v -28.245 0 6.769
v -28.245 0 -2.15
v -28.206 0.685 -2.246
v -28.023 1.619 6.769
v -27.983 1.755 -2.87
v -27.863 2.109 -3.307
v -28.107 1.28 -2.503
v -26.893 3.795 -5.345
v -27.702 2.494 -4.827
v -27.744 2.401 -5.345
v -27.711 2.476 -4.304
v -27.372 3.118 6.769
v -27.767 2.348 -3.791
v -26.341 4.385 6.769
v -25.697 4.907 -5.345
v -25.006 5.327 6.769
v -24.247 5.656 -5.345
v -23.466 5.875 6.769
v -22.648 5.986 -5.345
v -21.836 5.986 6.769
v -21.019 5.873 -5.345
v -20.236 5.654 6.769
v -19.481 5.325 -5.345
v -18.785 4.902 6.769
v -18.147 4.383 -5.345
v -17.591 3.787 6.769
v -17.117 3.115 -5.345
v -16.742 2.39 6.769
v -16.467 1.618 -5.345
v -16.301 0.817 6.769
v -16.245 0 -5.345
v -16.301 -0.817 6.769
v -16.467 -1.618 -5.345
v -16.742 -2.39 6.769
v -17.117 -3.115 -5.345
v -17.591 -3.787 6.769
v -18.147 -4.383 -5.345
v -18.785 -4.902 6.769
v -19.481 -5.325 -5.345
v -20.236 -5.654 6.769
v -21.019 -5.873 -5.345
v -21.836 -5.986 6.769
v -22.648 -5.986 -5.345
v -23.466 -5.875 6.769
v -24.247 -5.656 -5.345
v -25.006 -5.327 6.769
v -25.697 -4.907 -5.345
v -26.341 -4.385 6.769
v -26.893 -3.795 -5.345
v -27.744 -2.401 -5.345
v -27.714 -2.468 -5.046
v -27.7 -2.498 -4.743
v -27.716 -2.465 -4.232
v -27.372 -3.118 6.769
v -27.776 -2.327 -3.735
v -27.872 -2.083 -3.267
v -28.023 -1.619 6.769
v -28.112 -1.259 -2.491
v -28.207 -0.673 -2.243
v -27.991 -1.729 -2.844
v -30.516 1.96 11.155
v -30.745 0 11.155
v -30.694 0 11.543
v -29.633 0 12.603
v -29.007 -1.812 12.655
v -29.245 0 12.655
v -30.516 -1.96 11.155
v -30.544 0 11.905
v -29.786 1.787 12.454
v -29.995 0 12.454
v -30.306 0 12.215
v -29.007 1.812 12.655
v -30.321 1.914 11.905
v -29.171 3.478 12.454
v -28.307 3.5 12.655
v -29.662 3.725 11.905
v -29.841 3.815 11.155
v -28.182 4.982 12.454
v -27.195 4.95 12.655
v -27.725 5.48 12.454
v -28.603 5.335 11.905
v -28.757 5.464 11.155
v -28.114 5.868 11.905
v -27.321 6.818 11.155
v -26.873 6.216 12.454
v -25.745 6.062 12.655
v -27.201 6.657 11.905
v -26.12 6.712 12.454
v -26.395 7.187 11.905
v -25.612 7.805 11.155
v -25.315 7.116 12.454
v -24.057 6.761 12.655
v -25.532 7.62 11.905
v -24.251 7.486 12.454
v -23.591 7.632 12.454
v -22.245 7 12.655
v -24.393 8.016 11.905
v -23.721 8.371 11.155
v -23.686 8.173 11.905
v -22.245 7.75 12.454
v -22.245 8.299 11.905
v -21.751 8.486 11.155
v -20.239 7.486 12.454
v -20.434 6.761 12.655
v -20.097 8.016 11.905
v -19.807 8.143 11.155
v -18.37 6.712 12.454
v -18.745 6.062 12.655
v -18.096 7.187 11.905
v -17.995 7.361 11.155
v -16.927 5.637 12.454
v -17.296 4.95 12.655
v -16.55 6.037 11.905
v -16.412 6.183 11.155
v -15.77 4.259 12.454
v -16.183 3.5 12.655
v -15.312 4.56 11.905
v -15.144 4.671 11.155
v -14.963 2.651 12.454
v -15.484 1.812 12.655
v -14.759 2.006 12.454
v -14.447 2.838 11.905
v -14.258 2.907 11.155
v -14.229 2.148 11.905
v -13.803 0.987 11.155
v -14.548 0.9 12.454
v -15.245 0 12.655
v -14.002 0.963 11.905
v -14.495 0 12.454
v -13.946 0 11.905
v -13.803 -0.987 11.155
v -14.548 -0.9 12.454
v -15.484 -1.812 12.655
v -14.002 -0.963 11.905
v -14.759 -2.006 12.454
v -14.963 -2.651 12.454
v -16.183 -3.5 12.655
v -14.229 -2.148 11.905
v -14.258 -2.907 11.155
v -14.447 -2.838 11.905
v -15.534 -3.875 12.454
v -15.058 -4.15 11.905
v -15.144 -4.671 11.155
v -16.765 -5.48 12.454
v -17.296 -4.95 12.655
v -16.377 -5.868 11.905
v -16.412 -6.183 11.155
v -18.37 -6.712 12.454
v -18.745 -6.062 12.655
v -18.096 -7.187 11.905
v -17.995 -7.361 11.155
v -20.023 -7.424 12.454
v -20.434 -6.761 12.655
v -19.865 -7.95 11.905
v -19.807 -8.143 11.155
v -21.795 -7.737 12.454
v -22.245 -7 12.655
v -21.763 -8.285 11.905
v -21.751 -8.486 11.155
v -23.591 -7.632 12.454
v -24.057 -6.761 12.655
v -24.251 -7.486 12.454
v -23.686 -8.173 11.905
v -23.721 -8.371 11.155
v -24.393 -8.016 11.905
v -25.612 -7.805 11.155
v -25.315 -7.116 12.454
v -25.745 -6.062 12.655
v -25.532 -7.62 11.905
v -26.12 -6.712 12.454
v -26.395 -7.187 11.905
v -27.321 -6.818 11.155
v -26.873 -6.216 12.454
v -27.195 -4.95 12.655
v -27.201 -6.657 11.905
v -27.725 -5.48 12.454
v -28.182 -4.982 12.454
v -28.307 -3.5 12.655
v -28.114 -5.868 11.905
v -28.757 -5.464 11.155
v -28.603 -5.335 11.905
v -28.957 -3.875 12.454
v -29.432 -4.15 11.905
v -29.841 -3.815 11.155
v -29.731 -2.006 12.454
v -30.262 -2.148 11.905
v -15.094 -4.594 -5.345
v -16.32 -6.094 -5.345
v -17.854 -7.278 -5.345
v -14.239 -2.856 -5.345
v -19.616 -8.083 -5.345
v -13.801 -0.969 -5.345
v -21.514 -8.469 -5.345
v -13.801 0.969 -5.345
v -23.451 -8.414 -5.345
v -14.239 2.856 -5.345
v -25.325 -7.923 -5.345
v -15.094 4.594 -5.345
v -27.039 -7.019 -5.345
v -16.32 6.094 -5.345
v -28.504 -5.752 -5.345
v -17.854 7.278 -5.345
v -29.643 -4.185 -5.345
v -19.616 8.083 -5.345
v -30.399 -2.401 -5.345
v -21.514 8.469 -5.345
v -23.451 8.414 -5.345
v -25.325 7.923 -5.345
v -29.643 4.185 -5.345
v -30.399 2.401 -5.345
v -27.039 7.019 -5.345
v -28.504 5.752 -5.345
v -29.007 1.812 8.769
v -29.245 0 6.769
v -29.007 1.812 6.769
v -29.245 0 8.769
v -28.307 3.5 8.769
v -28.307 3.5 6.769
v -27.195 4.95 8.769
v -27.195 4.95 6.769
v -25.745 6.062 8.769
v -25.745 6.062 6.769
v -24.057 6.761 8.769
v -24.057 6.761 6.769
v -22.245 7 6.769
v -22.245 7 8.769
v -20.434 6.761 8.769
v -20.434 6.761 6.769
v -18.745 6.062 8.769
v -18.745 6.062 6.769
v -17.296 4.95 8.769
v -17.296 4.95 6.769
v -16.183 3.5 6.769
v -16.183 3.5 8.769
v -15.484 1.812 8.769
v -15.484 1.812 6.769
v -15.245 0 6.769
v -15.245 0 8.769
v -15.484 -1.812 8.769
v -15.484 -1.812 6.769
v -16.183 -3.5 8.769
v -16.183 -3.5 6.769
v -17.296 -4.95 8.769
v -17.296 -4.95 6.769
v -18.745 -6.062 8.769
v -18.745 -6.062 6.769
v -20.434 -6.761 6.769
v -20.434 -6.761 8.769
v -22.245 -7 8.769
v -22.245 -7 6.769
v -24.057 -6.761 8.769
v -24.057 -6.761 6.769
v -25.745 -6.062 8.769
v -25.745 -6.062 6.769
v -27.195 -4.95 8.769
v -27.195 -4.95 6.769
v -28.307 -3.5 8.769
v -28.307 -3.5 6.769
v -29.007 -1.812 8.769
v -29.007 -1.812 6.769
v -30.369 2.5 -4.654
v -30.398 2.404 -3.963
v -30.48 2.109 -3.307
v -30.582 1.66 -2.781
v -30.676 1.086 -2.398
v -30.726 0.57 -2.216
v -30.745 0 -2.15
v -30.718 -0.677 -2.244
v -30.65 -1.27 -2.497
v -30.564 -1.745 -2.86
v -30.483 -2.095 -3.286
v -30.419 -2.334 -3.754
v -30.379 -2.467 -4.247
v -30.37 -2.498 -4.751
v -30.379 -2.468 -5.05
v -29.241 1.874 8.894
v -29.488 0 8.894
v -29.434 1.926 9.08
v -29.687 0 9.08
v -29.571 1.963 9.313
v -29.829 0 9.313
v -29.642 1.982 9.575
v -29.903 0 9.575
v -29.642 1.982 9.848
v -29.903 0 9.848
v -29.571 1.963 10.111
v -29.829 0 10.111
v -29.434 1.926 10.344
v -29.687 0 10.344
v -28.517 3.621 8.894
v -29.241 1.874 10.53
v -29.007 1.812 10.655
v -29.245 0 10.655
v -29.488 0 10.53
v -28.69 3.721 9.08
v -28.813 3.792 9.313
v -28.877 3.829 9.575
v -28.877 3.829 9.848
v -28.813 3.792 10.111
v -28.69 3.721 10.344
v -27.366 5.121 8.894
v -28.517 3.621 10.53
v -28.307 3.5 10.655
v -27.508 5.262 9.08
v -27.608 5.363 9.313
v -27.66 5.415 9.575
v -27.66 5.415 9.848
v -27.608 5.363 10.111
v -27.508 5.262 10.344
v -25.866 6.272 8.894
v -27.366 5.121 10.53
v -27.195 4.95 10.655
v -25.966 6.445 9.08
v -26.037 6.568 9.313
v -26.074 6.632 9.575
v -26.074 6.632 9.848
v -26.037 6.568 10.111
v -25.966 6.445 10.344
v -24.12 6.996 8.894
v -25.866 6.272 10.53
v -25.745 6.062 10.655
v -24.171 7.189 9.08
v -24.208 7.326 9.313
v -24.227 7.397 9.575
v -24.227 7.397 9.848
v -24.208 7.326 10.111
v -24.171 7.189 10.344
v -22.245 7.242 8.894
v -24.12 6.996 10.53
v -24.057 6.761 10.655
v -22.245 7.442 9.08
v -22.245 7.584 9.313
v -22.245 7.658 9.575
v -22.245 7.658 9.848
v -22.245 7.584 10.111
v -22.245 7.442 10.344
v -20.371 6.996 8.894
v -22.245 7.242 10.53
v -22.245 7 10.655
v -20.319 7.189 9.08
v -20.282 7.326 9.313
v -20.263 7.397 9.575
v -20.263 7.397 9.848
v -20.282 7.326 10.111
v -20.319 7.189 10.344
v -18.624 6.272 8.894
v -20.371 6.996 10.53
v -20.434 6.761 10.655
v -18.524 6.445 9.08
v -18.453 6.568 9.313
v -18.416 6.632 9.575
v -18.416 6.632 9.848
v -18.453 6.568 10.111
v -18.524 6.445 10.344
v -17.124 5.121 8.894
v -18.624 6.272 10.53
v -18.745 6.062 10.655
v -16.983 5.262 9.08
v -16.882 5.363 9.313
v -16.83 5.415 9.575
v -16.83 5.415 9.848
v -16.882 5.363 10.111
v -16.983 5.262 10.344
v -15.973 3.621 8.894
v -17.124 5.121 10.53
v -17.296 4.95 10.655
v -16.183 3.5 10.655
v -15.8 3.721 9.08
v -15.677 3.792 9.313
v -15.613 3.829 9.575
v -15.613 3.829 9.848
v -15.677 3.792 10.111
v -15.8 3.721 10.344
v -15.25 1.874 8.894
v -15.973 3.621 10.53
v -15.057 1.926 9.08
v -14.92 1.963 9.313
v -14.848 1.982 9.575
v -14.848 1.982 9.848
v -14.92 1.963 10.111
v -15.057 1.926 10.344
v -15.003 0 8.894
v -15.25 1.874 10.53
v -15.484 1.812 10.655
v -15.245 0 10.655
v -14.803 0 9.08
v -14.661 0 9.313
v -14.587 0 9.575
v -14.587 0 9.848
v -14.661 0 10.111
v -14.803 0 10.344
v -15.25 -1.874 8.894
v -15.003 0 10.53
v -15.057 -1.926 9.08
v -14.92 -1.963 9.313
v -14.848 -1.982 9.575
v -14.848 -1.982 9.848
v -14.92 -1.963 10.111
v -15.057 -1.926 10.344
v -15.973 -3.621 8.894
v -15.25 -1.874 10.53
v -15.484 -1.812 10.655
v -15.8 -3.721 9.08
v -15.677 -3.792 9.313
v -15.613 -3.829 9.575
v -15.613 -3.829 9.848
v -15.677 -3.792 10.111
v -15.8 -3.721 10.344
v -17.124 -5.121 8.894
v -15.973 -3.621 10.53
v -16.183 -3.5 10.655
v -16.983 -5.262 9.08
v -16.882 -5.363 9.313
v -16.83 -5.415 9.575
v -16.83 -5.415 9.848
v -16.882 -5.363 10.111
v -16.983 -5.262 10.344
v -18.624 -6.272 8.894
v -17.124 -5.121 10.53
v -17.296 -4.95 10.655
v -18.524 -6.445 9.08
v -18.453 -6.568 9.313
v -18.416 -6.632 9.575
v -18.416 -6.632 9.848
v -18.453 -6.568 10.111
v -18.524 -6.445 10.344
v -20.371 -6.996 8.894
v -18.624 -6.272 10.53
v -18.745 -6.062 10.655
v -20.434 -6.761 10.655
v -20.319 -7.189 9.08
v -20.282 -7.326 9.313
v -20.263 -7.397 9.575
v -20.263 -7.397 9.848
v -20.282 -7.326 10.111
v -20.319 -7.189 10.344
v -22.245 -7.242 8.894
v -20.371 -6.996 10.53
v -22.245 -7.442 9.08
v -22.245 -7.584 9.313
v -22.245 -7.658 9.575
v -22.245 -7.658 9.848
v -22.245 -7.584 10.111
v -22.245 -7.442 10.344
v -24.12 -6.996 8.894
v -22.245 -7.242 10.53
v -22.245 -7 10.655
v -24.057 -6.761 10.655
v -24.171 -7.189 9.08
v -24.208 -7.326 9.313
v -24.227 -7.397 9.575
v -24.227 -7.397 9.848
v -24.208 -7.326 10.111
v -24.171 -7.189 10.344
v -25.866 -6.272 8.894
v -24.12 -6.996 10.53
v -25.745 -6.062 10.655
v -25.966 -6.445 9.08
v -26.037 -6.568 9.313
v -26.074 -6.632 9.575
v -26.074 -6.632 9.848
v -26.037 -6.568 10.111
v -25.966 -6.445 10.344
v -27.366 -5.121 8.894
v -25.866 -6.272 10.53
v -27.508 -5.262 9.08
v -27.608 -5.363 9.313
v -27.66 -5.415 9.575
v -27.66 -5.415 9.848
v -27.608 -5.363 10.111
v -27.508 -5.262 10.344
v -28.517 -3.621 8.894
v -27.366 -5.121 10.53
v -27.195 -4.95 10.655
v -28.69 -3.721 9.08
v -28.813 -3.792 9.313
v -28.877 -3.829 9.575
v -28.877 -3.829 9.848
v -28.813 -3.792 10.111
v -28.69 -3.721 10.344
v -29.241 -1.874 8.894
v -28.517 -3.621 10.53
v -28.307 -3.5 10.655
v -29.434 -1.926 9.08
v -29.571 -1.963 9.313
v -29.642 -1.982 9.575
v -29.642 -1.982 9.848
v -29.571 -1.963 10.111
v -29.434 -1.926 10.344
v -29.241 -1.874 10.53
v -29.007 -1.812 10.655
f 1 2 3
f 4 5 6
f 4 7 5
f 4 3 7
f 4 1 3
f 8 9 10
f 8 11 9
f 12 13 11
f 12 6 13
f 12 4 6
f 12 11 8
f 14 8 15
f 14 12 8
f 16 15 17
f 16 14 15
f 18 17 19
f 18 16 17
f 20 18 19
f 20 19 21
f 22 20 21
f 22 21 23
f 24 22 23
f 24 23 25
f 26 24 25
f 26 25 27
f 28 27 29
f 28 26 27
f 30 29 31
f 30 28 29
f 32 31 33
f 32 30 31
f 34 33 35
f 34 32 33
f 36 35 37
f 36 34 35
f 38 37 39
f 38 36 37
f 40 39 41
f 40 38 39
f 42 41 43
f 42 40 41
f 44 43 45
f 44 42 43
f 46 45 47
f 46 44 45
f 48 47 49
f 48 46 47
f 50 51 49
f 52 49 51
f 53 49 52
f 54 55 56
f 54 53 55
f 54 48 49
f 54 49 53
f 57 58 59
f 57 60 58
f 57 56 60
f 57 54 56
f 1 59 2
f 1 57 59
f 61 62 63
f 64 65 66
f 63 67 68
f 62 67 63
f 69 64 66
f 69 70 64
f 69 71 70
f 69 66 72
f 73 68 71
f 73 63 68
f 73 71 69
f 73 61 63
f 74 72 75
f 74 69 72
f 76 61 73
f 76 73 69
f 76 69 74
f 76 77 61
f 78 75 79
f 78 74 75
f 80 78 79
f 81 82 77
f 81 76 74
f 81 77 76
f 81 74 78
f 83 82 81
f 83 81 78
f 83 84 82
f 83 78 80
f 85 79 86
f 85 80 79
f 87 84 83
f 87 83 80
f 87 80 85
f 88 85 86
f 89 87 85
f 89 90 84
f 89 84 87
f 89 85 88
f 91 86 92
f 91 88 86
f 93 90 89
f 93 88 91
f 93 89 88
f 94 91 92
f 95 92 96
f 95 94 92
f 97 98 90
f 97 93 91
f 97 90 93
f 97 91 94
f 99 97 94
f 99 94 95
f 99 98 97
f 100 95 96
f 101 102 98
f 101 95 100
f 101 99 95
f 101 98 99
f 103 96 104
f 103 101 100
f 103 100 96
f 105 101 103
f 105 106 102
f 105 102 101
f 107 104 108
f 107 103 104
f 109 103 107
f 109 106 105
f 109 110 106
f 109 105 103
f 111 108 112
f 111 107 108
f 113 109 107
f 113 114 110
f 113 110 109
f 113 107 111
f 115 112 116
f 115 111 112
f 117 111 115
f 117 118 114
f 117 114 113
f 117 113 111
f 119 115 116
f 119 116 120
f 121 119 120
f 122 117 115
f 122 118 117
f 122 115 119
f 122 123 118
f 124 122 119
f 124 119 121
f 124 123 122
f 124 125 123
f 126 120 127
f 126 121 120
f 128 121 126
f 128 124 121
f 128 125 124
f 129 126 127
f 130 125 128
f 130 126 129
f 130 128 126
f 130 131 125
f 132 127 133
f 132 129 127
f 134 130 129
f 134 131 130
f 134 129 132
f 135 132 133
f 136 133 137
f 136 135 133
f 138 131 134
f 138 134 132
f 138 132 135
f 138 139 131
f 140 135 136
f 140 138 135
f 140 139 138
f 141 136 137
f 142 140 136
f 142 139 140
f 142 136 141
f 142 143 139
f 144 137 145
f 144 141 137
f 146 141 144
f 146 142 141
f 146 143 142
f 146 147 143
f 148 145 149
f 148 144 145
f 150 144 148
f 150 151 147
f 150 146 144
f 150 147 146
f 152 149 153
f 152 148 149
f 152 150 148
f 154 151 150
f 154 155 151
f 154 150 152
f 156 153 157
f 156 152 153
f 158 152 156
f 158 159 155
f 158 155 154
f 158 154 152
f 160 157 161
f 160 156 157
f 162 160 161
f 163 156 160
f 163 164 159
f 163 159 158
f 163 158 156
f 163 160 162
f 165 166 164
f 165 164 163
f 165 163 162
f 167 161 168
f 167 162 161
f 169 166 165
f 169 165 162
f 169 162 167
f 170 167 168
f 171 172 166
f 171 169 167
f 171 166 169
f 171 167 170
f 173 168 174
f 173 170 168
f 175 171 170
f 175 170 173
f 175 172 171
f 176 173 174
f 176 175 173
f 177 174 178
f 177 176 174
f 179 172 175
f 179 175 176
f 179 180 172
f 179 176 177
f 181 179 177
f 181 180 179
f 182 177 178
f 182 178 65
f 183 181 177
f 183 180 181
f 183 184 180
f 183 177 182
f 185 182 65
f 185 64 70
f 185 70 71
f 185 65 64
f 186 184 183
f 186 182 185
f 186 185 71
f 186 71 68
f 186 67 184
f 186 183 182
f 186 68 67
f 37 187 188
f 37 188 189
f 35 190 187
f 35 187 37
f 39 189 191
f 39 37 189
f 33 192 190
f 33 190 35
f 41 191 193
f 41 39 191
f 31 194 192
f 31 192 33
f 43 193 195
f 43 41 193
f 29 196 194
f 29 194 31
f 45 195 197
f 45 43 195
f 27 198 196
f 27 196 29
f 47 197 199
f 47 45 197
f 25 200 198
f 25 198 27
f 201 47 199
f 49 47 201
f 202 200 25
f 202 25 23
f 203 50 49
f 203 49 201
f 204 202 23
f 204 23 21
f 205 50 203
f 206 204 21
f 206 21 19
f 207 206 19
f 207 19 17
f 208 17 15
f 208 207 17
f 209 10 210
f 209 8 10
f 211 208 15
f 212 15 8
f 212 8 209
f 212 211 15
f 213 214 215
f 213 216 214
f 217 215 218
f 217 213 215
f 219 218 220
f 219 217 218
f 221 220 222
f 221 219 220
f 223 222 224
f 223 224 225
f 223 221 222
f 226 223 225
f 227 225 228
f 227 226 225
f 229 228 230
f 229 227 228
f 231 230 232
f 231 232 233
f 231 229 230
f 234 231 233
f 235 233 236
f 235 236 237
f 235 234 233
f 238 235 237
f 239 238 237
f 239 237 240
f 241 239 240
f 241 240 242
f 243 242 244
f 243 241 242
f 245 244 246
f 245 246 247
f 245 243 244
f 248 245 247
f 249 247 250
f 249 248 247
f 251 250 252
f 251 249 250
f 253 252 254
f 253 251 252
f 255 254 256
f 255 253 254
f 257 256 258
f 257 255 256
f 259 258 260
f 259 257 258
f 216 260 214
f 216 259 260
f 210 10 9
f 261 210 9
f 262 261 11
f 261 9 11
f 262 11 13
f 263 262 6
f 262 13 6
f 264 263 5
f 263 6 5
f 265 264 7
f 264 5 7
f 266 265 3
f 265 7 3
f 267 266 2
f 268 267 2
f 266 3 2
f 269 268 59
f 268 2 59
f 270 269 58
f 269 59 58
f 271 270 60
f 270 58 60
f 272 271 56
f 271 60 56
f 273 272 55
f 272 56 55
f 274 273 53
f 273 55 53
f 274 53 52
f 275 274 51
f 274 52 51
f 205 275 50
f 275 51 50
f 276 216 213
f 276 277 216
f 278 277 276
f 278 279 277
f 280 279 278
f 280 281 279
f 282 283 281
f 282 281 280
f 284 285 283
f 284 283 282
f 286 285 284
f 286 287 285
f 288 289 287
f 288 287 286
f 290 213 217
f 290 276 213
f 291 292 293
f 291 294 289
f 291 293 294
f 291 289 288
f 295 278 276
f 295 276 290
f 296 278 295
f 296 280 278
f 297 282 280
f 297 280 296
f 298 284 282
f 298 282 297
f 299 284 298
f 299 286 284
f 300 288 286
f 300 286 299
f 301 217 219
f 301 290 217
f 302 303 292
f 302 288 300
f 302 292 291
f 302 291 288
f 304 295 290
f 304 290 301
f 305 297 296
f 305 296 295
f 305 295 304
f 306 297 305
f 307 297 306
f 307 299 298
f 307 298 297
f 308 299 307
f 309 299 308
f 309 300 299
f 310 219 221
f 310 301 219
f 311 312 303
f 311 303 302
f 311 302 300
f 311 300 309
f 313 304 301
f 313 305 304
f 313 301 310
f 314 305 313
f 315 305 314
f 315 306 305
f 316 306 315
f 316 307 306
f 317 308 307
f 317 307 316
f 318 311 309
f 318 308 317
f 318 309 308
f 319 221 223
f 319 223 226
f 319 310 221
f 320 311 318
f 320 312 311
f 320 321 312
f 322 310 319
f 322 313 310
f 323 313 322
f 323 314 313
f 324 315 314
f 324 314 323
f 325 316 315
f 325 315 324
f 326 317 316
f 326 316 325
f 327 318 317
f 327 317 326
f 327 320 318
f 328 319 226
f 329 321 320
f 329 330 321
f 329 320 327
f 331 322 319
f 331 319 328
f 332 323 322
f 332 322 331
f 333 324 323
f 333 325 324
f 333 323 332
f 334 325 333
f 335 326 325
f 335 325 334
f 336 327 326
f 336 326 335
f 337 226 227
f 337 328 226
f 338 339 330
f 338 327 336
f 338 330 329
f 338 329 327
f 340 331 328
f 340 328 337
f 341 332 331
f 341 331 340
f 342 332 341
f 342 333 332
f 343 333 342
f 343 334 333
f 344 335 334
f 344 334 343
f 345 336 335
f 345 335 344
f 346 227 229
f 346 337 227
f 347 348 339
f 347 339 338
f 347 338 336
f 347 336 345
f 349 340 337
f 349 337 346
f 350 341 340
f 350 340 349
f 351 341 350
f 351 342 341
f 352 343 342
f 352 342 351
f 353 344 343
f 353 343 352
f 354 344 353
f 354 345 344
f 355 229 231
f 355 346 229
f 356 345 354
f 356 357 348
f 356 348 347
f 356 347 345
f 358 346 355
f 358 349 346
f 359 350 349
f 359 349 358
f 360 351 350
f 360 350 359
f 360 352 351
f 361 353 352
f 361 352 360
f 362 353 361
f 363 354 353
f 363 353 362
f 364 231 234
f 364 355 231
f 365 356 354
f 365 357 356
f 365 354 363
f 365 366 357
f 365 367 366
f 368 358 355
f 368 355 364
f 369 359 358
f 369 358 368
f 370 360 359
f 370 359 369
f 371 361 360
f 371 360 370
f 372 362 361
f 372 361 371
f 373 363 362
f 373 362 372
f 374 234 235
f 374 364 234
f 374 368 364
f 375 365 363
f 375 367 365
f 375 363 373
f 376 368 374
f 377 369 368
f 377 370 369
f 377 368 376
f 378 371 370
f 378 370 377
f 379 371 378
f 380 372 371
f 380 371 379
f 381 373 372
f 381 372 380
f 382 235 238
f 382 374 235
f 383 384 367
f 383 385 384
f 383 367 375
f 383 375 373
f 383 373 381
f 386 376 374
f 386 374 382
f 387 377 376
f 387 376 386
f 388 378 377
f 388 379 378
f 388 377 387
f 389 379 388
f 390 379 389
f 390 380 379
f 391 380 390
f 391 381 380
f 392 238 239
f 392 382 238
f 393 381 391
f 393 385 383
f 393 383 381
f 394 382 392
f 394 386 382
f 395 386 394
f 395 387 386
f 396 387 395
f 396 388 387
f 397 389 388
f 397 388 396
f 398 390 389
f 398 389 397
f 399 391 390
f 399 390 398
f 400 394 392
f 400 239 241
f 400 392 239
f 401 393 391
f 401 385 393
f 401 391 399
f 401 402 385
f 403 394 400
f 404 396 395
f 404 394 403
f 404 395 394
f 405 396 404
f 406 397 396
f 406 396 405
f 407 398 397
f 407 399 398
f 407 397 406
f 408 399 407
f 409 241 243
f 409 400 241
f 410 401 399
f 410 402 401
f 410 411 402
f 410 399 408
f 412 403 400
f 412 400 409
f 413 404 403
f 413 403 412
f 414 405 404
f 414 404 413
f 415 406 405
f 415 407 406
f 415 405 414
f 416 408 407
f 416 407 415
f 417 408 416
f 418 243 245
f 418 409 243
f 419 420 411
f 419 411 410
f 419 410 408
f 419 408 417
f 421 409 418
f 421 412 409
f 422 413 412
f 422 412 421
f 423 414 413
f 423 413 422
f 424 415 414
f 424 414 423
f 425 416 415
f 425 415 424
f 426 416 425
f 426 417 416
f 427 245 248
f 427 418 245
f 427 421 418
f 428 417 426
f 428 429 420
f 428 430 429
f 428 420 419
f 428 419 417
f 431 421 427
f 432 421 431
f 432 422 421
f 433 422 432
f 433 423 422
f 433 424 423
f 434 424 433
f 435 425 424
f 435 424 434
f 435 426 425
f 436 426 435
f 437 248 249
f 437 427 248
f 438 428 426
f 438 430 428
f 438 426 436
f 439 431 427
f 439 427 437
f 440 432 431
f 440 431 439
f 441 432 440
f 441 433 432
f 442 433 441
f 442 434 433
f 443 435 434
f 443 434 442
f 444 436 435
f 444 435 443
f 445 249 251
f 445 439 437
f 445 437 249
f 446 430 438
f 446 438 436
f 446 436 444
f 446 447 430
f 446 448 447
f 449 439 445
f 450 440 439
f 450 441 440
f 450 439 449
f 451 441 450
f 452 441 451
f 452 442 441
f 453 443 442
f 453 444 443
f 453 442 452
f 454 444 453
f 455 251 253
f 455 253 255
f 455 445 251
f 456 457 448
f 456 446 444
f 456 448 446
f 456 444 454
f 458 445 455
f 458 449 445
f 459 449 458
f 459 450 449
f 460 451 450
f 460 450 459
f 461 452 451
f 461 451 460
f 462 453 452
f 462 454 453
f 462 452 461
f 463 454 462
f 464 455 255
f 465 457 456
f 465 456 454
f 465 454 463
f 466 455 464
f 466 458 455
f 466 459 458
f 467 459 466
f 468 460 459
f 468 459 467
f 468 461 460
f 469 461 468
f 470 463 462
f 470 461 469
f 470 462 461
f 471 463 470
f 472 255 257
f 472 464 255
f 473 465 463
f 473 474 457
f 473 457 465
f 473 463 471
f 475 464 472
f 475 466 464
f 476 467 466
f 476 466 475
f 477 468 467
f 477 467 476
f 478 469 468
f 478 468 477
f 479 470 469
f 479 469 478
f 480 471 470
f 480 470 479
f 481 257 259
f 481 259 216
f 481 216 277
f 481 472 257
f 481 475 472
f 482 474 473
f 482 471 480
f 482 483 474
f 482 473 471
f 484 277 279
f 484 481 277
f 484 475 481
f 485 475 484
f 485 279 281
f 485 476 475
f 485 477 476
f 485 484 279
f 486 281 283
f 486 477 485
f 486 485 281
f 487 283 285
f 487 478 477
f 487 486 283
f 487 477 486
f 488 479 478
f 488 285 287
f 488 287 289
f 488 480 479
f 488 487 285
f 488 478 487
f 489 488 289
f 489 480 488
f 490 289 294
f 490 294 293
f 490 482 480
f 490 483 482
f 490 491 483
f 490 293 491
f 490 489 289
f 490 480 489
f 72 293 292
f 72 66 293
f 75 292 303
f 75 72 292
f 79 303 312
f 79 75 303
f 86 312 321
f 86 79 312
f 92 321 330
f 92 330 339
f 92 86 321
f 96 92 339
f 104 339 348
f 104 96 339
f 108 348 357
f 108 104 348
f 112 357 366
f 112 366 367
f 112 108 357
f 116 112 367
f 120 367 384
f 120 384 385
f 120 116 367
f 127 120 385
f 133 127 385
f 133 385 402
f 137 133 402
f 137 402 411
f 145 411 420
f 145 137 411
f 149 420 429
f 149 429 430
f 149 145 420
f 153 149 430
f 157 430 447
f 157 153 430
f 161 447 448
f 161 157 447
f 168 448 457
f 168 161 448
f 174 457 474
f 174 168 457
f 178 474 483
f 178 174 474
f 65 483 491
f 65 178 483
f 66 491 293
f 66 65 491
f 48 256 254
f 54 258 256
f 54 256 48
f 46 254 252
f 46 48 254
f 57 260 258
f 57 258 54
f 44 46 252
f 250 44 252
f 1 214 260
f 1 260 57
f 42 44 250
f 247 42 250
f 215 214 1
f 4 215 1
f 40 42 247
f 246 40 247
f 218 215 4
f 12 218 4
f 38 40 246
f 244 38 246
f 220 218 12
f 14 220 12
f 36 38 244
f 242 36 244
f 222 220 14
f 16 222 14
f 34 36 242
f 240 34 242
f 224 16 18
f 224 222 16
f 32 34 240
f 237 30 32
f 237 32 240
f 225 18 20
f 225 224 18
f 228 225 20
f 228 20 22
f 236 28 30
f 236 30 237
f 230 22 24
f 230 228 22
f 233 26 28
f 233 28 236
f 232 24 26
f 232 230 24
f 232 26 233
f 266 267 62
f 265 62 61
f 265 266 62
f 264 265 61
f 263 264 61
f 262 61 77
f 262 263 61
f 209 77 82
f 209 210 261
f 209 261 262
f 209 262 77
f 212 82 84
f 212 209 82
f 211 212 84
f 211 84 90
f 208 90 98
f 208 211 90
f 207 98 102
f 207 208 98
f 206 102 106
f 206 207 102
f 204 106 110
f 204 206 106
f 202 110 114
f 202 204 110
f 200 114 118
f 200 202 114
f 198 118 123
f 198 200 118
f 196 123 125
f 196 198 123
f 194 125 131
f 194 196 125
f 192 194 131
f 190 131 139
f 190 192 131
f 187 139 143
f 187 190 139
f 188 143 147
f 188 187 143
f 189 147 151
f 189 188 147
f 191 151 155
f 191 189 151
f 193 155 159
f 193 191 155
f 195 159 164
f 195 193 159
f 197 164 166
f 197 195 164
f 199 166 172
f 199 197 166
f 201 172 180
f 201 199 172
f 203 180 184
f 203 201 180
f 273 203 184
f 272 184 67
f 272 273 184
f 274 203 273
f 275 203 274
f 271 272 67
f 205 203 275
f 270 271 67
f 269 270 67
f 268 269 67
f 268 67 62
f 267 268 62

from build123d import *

# Parameters (mm, degrees)
F2_R     = 1.49999
F4_R     = 2.5
F5_DEPTH = 25


# Not quite as in the source:
# - a fillet or chamfer is up to 0.001 mm smaller than in the source, because OpenCascade refuses the exact size


with BuildPart() as f1:
    # F0 (on Front) → F1 (revolve)
    with BuildSketch(Plane.XZ):
        with BuildLine():
            Line((-29.2452627023, 12.6545929811), (-30.7452627023, 12.6545929811))
            Line((-30.7452627023, 12.6545929811), (-30.7452627023, -5.3454070189))
            Line((-30.7452627023, -5.3454070189), (-28.2452627023, -5.3454070189))
            Line((-28.2452627023, -5.3454070189), (-28.2452627023, 6.7686133647))
            Line((-28.2452627023, 6.7686133647), (-29.2452627023, 6.7686133647))
            Line((-29.2452627023, 6.7686133647), (-29.2452627023, 8.7686133647))
            ThreePointArc((-29.2452627023, 8.7686133647), (-29.9124410959, 9.7116031729), (-29.2452627023, 10.6545929811))
            Line((-29.2452627023, 10.6545929811), (-29.2452627023, 12.6545929811))
        make_face()
    revolve(axis=Axis((-22.2452627023, 0, 3.276667092), (0, 0, -1)))

    # F2 (radius 1.5 in the source; OpenCascade refuses exactly that, so slightly less here)
    f2_edges = [f1.edges().sort_by_distance(p)[0] for p in [
        (-13.745263, 0, 12.654593),
    ]]
    fillet(f2_edges, radius=F2_R)

    # F4 (on offset) → F5 (cut)
    with BuildSketch(Plane.YZ.offset(-25)):
        with Locations((0, -4.6502733603)):
            Circle(F4_R)
    extrude(amount=-F5_DEPTH, mode=Mode.SUBTRACT)


solid = f1.part
